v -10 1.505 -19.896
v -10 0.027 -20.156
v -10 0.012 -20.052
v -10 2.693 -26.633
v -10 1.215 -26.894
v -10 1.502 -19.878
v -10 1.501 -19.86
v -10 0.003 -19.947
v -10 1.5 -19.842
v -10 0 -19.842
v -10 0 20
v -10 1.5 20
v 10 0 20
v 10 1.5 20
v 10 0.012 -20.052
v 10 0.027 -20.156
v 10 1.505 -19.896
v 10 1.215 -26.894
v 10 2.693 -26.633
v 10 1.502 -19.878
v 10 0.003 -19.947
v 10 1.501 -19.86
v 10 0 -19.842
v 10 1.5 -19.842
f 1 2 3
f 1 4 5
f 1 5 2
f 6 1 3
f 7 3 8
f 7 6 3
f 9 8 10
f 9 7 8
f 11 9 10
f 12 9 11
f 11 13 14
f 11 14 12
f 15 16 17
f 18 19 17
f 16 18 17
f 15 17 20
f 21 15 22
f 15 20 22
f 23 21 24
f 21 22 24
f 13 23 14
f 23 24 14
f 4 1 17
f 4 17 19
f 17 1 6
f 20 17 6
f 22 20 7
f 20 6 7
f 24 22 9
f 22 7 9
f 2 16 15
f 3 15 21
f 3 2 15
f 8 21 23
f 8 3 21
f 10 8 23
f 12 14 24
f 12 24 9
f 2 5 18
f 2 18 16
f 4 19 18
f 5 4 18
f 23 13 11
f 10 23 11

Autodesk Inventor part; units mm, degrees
ref_plane "YZ Plane" through (0, 0, 0) normal (1, 0, 0) x (0, 1, 0)
ref_plane "XZ Plane" through (0, 0, 0) normal (0, 1, 0) x (-1, 0, 0)
ref_plane "XY Plane" through (0, 0, 0) normal (0, 0, 1) x (1, 0, 0)
sketch "Sketch1" plane through (0, 0, 0) normal (0, 1, 0) x (-1, 0, 0)
  line L0 (-10, 20) -> (10, 20)
  line L1 (10, 20) -> (10, -20)
  line L2 (10, -20) -> (-10, -20)
  line L3 (-10, -20) -> (-10, 20)
  line L4 (-10, 20) -> (10, -20) construction
  line L5 (10, 20) -> (-10, -20) construction
  point P0 (0, 0)
  dimension "d0" = 40
  dimension "d1" = 20
extrude "Plate1" add sketch "Sketch1" along normal blind 1.5
sketch "Sketch2" plane through (-10, 1.4772, -19.7395) normal (0, -0.9848078, -0.1736482) x (1, 0, 0)
  line L0 (20, 0) -> (0, 0)
  line L1 (0, 0) -> (0, -7)
  line L2 (0, -7) -> (20, -7)
  line L3 (20, -7) -> (20, 0)
edge flange "Flange1" height 7 angle 10 thickness 1.5 bend radius 0.31 thickness toward (0, -0.9848078, -0.1736482) relief tear relief width 1.5 relief depth 0.75 edges at (0, 1.5, -20) wall of the first edge with corners at (10, 1.4772, -19.7395) (-10, 1.4772, -19.7395) (-10, 2.6927, -26.6332) (10, 2.6927, -26.6332)
bend "Bend1"
corner "Corner1"
equation "\"d2\" = Thickness"
equation "\"d3\" = BendReliefWidth"
equation "\"d4\" = BendReliefDepth"
equation "\"d5\" = MinimumRemnant"
equation "\"d6\" = TransitionRadius"
equation "\"d9\" = BendRadius"
equation "\"d10\" = CornerReliefSize"
equation "\"d11\" = GapSize"
equation "\"d12\" = JacobiRadiusSize"
equation "\"BendReliefWidth\" = Thickness"
equation "\"BendReliefDepth\" = 0.5 * Thickness"
equation "\"CornerReliefSize\" = 4 * Thickness"
equation "\"MinimumRemnant\" = 2 * Thickness"
equation "\"TransitionRadius\" = BendRadius"
equation "\"JacobiRadiusSize\" = BendRadius"
equation "\"GapSize\" = Thickness"
equation "\"Thickness\" = 1.5"
equation "\"BendRadius\" = 0.31"
properties part number "axis_23_bottom_frame" material "Aluminum 6061-AHC"
